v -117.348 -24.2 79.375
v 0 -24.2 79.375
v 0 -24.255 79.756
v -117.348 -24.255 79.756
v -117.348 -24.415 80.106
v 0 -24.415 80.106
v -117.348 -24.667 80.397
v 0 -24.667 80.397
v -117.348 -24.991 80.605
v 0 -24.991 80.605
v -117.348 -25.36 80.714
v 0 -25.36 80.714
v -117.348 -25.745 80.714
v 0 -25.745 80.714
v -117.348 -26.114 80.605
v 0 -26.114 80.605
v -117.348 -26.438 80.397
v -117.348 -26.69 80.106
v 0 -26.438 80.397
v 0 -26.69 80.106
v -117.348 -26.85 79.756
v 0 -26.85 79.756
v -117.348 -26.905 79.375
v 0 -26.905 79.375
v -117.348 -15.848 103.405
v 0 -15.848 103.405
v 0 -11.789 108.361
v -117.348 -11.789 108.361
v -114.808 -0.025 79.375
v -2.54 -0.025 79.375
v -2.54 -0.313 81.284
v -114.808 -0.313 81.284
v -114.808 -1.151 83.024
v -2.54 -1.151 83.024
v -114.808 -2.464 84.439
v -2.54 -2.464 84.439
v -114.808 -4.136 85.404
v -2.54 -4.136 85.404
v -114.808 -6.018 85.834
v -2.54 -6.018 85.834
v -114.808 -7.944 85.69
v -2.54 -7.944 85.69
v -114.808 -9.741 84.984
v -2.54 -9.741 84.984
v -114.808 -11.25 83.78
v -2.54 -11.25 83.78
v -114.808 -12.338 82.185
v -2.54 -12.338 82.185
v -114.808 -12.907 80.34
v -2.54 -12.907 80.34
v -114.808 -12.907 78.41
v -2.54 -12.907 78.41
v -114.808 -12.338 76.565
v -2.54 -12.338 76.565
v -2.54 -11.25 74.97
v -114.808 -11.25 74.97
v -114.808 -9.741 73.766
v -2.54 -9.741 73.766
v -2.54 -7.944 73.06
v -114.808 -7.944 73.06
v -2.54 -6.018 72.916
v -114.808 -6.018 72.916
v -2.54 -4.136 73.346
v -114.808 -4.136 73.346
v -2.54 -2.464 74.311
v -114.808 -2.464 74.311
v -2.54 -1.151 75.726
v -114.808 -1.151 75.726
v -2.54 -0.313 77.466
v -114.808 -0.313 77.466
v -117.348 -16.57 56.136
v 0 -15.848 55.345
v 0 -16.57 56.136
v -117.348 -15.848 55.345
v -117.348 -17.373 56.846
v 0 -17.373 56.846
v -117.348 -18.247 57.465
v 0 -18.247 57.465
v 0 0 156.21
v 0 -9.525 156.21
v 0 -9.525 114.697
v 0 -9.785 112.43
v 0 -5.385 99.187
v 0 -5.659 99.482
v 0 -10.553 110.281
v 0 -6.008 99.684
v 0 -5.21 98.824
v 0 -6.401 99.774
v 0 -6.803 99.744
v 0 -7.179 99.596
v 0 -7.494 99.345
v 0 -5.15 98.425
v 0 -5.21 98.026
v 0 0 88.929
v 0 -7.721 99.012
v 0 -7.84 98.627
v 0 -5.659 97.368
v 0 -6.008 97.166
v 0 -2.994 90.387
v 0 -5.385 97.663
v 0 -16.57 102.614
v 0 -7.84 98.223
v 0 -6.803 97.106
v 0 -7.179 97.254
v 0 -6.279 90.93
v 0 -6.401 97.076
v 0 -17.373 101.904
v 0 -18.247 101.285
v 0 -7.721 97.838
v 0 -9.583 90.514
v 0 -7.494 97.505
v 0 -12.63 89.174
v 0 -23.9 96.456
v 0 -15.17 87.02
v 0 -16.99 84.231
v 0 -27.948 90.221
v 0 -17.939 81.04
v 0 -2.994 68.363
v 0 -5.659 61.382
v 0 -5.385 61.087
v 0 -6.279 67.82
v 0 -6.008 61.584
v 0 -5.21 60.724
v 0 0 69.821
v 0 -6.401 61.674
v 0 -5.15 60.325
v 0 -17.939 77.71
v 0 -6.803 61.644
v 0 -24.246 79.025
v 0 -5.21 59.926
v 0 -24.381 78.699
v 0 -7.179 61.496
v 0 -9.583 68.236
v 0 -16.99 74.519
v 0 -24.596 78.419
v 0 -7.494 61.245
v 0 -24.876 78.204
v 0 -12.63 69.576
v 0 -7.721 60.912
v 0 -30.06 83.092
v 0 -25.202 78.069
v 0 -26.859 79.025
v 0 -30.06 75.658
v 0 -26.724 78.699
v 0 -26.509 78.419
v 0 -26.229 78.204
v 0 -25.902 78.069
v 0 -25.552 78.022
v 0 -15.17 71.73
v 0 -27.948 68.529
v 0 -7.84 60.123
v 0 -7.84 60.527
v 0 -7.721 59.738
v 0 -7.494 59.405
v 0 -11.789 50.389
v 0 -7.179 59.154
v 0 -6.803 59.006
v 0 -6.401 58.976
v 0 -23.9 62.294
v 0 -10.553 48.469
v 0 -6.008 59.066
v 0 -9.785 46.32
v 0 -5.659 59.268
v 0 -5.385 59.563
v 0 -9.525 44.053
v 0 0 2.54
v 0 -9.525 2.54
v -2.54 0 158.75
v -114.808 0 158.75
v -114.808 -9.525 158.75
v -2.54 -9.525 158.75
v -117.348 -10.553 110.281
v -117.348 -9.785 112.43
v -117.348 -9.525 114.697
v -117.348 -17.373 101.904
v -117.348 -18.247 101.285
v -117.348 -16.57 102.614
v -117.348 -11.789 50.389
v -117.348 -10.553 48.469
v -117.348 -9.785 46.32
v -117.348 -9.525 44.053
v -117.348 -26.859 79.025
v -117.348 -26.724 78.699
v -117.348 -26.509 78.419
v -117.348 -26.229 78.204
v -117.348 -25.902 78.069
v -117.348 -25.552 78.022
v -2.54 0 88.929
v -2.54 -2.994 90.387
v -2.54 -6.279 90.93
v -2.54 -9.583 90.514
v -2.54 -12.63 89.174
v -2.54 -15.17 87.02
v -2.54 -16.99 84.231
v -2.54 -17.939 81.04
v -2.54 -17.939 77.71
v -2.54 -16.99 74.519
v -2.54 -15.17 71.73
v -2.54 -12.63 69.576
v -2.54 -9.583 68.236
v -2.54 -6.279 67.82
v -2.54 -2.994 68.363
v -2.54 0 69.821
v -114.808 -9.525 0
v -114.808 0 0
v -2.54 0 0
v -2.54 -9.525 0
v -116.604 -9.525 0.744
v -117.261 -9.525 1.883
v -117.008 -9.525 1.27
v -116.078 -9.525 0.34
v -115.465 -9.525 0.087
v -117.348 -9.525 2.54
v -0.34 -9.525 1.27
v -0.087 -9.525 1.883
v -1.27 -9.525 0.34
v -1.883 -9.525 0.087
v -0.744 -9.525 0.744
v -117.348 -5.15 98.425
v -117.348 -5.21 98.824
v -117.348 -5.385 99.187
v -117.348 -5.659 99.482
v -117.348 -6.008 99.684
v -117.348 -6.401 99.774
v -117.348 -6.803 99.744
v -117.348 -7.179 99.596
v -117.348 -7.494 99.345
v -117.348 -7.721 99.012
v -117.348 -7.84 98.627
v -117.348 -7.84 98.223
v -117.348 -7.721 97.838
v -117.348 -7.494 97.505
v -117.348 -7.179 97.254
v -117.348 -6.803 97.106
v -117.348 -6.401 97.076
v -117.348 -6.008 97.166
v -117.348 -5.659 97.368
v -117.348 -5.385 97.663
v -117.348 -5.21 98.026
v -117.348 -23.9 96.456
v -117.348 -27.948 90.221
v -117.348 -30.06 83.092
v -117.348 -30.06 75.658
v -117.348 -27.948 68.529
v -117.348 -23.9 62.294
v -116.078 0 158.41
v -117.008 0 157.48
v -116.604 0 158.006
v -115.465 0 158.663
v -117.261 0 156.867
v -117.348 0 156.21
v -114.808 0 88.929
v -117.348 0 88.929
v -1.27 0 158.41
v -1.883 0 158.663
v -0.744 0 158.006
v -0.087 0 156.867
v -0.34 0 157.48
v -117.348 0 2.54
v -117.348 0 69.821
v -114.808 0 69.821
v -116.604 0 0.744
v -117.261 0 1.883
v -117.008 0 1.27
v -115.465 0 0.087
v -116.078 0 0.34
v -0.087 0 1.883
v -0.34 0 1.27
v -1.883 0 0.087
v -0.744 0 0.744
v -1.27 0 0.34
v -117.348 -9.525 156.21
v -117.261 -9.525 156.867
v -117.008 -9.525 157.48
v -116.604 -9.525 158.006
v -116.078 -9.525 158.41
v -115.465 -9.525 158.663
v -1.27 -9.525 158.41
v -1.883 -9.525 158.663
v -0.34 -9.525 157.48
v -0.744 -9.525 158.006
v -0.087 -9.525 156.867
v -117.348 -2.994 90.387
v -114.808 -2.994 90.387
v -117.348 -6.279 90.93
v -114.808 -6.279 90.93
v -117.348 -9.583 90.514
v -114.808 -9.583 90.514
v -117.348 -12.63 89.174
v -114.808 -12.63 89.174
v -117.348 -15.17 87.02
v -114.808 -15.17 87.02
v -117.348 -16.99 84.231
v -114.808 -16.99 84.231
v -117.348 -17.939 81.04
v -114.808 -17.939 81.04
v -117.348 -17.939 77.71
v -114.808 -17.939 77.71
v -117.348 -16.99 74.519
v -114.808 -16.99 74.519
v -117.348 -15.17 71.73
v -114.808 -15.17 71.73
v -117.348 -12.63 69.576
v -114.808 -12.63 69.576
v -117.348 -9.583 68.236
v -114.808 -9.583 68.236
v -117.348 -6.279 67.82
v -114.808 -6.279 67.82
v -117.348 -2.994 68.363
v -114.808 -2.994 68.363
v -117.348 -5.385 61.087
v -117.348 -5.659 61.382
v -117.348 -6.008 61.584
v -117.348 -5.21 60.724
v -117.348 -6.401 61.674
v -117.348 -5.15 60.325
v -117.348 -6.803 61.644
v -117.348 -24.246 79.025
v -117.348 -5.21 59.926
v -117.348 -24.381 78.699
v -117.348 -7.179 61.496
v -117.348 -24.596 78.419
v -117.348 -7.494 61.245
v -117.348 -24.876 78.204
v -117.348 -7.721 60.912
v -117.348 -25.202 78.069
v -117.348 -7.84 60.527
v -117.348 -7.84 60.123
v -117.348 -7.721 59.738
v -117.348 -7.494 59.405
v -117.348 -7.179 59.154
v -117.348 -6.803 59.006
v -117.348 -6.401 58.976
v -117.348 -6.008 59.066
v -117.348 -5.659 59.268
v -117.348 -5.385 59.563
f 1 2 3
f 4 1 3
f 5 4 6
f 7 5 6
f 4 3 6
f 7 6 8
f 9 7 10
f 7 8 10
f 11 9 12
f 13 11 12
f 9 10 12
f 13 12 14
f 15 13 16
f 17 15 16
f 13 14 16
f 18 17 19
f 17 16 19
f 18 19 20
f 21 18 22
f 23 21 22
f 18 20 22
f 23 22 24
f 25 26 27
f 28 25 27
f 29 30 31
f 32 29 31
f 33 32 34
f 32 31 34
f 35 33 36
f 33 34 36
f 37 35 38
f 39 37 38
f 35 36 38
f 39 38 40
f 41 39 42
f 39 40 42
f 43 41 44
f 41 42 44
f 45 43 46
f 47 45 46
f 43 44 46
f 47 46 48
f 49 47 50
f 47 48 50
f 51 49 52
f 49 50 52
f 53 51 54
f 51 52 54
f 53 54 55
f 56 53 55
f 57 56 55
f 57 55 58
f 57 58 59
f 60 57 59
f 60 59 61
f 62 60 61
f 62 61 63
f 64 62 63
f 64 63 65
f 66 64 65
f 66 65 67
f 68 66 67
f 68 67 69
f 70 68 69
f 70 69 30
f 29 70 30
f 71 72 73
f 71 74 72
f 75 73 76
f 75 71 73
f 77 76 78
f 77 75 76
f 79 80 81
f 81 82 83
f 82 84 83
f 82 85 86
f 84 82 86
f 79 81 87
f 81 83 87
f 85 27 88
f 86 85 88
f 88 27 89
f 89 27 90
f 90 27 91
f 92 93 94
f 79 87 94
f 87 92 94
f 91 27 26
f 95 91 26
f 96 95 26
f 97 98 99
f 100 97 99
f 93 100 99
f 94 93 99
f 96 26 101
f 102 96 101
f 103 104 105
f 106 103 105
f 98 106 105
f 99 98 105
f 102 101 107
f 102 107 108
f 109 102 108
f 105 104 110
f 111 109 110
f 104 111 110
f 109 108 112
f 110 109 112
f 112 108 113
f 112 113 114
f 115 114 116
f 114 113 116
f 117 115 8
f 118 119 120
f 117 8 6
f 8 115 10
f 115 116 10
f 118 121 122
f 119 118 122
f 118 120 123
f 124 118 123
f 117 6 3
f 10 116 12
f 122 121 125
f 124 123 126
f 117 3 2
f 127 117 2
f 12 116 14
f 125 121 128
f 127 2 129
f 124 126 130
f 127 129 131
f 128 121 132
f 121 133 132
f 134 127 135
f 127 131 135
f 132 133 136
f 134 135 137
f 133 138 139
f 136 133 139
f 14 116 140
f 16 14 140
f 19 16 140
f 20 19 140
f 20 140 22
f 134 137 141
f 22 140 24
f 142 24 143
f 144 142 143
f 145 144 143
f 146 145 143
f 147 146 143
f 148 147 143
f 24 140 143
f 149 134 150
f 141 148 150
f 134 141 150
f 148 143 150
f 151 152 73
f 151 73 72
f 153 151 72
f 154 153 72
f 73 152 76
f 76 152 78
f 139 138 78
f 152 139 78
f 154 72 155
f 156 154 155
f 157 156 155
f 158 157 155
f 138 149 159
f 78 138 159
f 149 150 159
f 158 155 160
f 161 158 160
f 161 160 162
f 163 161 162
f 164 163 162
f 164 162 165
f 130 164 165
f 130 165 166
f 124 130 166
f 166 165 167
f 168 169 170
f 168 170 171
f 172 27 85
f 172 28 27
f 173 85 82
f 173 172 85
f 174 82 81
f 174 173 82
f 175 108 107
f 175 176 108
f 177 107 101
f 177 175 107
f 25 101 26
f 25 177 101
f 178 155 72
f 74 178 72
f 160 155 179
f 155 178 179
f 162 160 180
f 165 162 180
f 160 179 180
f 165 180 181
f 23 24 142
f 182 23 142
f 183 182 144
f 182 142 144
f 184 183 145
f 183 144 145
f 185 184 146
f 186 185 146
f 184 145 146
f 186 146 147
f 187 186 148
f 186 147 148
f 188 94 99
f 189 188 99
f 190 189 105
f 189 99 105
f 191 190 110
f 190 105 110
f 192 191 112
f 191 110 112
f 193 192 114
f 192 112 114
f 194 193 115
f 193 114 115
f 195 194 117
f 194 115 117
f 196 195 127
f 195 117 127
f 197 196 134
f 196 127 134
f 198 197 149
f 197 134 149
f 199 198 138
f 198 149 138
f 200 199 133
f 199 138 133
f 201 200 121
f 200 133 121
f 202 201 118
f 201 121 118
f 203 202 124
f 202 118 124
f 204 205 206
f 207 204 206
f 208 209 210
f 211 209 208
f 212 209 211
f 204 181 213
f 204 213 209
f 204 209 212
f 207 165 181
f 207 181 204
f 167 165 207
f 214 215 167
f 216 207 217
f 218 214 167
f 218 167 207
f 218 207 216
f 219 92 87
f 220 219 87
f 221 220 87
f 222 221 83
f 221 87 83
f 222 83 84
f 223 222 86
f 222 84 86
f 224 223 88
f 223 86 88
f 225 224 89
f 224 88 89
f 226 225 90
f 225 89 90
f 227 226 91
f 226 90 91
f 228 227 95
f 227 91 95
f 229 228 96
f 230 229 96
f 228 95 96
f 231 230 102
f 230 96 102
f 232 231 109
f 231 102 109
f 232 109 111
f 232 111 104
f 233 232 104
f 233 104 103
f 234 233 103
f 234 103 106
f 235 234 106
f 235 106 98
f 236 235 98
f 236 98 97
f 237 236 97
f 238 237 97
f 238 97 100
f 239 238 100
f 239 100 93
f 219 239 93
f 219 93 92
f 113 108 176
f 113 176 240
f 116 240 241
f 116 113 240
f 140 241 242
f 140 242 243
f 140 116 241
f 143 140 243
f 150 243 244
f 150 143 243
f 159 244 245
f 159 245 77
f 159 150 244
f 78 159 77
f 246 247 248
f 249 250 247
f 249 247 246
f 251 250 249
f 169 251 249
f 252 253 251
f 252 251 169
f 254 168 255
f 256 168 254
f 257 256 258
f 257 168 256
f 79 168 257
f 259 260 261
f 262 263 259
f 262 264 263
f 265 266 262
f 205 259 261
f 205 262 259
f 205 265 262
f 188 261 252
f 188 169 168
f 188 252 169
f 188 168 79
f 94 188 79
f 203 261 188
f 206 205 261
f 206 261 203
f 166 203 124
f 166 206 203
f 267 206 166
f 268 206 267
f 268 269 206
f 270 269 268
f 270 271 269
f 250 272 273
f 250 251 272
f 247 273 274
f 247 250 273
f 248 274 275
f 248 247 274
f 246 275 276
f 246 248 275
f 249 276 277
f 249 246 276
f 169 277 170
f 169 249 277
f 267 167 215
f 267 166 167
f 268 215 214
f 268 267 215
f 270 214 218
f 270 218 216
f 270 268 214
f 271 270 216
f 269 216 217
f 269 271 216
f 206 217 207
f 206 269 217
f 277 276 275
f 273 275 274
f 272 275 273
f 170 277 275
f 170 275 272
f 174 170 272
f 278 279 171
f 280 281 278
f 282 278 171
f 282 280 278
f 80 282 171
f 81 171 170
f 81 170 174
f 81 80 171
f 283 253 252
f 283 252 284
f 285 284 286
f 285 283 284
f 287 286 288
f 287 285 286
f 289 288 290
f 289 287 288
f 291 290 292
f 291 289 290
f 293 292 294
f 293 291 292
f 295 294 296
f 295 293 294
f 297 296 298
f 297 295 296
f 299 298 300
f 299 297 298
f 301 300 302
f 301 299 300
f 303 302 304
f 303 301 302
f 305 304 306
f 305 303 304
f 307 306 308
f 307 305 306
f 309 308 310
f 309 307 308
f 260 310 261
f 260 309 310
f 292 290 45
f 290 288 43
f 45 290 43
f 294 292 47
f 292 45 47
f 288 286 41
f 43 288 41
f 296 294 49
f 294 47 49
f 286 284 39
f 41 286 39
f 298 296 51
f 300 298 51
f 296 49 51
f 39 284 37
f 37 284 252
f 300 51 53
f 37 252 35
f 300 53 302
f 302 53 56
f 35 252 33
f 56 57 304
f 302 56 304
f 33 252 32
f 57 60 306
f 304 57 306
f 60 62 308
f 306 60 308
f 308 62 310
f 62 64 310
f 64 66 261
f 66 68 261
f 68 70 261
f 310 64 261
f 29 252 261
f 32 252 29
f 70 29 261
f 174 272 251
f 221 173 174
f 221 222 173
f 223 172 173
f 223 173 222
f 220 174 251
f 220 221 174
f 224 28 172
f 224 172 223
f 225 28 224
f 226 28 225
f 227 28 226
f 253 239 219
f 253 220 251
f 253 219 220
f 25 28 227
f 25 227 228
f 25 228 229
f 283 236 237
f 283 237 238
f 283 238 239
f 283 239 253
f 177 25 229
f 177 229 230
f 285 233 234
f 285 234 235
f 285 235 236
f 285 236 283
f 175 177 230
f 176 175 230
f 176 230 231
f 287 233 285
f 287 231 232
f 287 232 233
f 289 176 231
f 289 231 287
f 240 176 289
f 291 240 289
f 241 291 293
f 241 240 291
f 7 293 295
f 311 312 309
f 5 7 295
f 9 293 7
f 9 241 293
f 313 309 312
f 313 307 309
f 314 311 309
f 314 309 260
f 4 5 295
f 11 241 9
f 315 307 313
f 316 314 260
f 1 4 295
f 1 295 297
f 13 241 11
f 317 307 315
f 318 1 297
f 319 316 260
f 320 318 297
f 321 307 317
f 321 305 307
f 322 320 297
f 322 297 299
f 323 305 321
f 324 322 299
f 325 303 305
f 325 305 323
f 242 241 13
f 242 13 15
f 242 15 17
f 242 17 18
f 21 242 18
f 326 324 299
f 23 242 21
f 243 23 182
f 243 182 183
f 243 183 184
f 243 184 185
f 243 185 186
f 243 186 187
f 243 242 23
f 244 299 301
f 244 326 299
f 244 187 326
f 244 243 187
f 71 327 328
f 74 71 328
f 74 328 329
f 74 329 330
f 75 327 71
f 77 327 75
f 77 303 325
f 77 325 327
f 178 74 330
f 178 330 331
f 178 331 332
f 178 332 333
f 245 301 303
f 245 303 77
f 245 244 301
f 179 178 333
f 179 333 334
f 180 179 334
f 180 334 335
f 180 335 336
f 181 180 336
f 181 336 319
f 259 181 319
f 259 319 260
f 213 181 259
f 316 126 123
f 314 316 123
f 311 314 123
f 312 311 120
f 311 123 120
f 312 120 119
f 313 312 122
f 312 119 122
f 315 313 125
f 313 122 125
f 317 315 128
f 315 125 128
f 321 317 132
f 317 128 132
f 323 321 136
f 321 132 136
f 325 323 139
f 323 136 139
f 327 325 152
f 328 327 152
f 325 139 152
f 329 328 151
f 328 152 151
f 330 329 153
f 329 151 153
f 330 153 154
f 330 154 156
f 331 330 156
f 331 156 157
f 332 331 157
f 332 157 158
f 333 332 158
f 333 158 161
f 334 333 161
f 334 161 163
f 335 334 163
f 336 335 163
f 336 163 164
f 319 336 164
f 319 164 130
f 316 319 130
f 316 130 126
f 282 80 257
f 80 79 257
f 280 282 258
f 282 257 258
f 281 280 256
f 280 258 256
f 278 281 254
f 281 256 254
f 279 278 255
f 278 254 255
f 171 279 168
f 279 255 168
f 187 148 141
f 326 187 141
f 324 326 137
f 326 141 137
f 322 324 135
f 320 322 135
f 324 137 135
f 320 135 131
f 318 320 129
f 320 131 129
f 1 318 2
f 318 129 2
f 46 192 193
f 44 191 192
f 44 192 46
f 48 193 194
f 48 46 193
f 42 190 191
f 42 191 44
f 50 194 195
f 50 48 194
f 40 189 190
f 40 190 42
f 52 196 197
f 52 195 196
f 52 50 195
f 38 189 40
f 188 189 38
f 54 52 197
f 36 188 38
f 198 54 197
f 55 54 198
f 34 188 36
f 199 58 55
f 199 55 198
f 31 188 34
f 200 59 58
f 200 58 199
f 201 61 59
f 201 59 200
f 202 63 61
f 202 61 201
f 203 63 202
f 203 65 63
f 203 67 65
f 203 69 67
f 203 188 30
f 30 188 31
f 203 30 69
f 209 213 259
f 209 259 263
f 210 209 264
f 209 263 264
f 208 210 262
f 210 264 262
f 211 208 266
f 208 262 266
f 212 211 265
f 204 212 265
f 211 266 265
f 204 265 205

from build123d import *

# Parameters (mm, degrees)
SKETCH1_W           = 117.348
SKETCH1_H           = 38.1
BOSS_EXTRUDE1_DEPTH = 158.75
SKETCH2_R           = 1.35255
CUT_EXTRUDE1_DEPTH  = 152.4
SKETCH3_R           = 6.477
CUT_EXTRUDE4_DEPTH  = 154.686
SKETCH4_R           = 11.557
CUT_EXTRUDE5_DEPTH  = 2.54
CUT_EXTRUDE6_DEPTH  = 254
CHAMFER1_SIZE       = 6.35
FILLET1_R           = 10
FILLET2_R           = 2.54


with BuildPart() as part:
    # Sketch1 → Boss-Extrude1 (new body)
    with BuildSketch(Plane.XY):
        with Locations((-58.674, -19.05)):
            Rectangle(SKETCH1_W, SKETCH1_H)
    extrude(amount=BOSS_EXTRUDE1_DEPTH)

    # Sketch2 → Cut-Extrude1 (cut)
    with BuildSketch(Plane(origin=(0, 0, 0), x_dir=(0, 0, -1), z_dir=(1, 0, 0))):
        with Locations(Location((-98.425, -6.5024, 0), (0, 0, 90))):
            Circle(SKETCH2_R)
        with BuildLine():
            ThreePointArc((-78.02245, -25.5524), (-78.418602723, -24.596002723), (-79.375, -24.19985))
            Line((-79.375, -24.19985), (-79.375, -26.90495))
            ThreePointArc((-79.375, -26.90495), (-78.418602723, -26.508797277), (-78.02245, -25.5524))
        make_face()
        with BuildLine():
            Line((-79.375, -26.90495), (-79.375, -24.19985))
            ThreePointArc((-79.375, -24.19985), (-80.72755, -25.5524), (-79.375, -26.90495))
        make_face()
        with Locations(Location((-60.325, -6.5024, 0), (0, 0, 90))):
            Circle(SKETCH2_R)
    extrude(amount=-CUT_EXTRUDE1_DEPTH, mode=Mode.SUBTRACT)

    # Sketch3 → Cut-Extrude4 (cut)
    with BuildSketch(Plane(origin=(0, 0, 0), x_dir=(0, 0, -1), z_dir=(1, 0, 0))):
        with Locations(Location((-79.375, -6.5024, 0), (0, 0, 90))):
            Circle(SKETCH3_R)
    extrude(amount=-CUT_EXTRUDE4_DEPTH, mode=Mode.SUBTRACT)

    # Sketch4 → Cut-Extrude5 (cut)
    with BuildSketch(Plane(origin=(0, 0, 0), x_dir=(0, 0, -1), z_dir=(1, 0, 0))):
        with Locations((-79.375, -6.5024)):
            Circle(SKETCH4_R)
    cut_extrude5 = extrude(amount=-CUT_EXTRUDE5_DEPTH, mode=Mode.SUBTRACT)

    # Mirror1: Cut-Extrude5 across plane
    add(cut_extrude5.mirror(Plane(origin=(-58.674, 0, 0), x_dir=(0, 0, 1), z_dir=(1, 0, 0))), mode=Mode.SUBTRACT)

    # Sketch5 → Cut-Extrude6 (cut)
    with BuildSketch(Plane(origin=(0, 0, 0), x_dir=(0, 0, -1), z_dir=(1, 0, 0))):
        with BuildLine():
            Line((-158.75, -9.525), (-104.775, -9.525))
            ThreePointArc((-104.775, -9.525), (-79.375, -30.327663184), (-53.975, -9.525))
            Line((-53.975, -9.525), (0, -9.525))
            Line((0, -9.525), (0, -59.754484856))
            Line((0, -59.754484856), (-158.75, -59.754484856))
            Line((-158.75, -59.754484856), (-158.75, -9.525))
        make_face()
    extrude(amount=-CUT_EXTRUDE6_DEPTH, mode=Mode.SUBTRACT)

    # Chamfer1
    # the kernel refuses this chamfer: 6.35 mm, written as the material it adds along each edge
    with BuildSketch(Plane(origin=(0, -9.525, 104.775), x_dir=(0, -0.938739264670919, -0.3446281952555571), z_dir=(-1, 0, 0))) as chamfer1_piece_1:
        with BuildLine():
            Line((7.921952063, 0), (-CHAMFER1_SIZE * 0.344628195256, CHAMFER1_SIZE * 0.938739264671))
            Line((-CHAMFER1_SIZE * 0.344628195256, CHAMFER1_SIZE * 0.938739264671), (0, 0))
            ThreePointArc((0, 0), (4.071956682, 0.304341963), (7.921952063, 0))
        make_face()
    extrude(amount=117.348)
    with BuildSketch(Plane(origin=(0, -9.525, 53.975), x_dir=(0, 0, -1), z_dir=(-1, 0, 0))) as chamfer1_piece_2:
        with BuildLine():
            Line((CHAMFER1_SIZE, 0), (-2.730128042, 7.436647454))
            ThreePointArc((-2.730128042, 7.436647454), (-1.117613332, 3.927390442), (0, 0))
            Line((0, 0), (CHAMFER1_SIZE, 0))
        make_face()
    extrude(amount=117.348)

    # Fillet1
    fillet1_edges = [part.edges().sort_by_distance(p)[0] for p in [
        (-58.674, -9.525, 111.125),
        (-58.674, -16.961647454, 56.705128042),
        (-58.674, -16.961647454, 102.044871958),
        (-58.674, -9.525, 47.625),
    ]]
    fillet(fillet1_edges, radius=FILLET1_R)

    # Fillet2
    fillet2_edges = [part.edges().sort_by_distance(p)[0] for p in [
        (-117.348, -4.7625, 158.75),
        (-117.348, -4.7625, 0),
        (0, -4.7625, 0),
        (0, -4.7625, 158.75),
    ]]
    fillet(fillet2_edges, radius=FILLET2_R)


solid = part.part
